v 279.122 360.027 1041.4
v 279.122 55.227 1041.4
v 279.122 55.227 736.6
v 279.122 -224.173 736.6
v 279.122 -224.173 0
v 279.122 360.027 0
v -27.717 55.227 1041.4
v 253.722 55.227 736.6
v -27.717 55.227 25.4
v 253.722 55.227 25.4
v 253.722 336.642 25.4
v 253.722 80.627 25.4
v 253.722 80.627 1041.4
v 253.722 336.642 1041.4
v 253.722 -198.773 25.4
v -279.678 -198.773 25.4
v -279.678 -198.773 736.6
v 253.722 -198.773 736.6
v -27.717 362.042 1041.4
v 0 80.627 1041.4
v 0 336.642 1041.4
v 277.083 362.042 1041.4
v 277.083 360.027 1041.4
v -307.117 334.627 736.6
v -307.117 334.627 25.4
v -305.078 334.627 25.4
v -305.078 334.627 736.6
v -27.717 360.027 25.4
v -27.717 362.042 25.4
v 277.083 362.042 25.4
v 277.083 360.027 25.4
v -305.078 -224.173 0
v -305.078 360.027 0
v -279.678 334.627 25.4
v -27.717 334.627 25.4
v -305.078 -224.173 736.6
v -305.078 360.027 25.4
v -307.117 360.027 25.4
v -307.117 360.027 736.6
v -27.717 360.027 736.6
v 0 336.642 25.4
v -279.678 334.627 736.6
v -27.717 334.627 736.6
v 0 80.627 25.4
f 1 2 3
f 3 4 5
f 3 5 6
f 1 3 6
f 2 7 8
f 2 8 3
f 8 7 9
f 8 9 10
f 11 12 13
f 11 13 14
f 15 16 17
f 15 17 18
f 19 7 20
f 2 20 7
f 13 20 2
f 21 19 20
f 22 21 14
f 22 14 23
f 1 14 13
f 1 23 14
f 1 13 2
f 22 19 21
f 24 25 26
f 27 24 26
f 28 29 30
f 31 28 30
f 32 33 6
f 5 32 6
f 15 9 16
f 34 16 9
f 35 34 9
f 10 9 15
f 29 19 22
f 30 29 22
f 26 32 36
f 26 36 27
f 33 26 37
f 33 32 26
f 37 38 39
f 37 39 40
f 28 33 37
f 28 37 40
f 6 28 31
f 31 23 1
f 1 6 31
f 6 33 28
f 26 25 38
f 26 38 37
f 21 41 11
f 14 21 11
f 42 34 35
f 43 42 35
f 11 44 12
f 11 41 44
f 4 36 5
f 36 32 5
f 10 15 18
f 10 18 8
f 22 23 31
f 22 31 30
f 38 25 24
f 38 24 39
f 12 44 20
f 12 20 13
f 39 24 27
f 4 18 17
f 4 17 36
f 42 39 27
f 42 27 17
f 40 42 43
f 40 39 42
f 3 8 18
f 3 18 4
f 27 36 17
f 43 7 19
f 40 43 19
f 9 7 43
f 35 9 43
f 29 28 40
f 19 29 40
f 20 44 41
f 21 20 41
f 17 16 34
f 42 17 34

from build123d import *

# Parameters (mm, degrees)
F0_W      = 584.2
F0_H      = 584.2
F1_DEPTH  = 25.4
F2_W      = 25.4
F2_H      = 304.8
F3_DEPTH  = 1016
F4_W      = 304.8
F4_H      = 25.4
F5_DEPTH  = 1016
F6_W      = 27.716884
F6_H      = 304.8
F7_DEPTH  = 1016
F8_W      = 306.838674
F8_H      = 25.4
F9_DEPTH  = 1016
F10_W     = 25.4
F10_H     = 279.4
F11_DEPTH = 711.2
F12_W     = 584.2
F12_H     = 25.4
F13_DEPTH = 711.2
F14_W     = 25.4
F14_H     = 584.2
F15_DEPTH = 711.2
F16_W     = 279.4
F16_H     = 25.4
F17_DEPTH = 711.2


with BuildPart() as f1:
    # F0 (on Top) → F1 (new body)
    with BuildSketch(Plane.XY):
        with Locations((-12.97821, 67.926513)):
            Rectangle(F0_W, F0_H)
    extrude(amount=F1_DEPTH)

    # F2 (on face) → F3 (join)
    with BuildSketch(Plane.XY.offset(25.4)):
        with Locations((266.42179, 207.626513)):
            Rectangle(F2_W, F2_H)
    extrude(amount=F3_DEPTH)

    # F4 (on face) → F5 (join)
    with BuildSketch(Plane.XY.offset(25.4)):
        with Locations((124.683116, 349.342086)):
            Rectangle(F4_W, F4_H)
    extrude(amount=F5_DEPTH)

    # F6 (on face) → F7 (join)
    with BuildSketch(Plane.XY.offset(25.4)):
        with Locations((-13.858442, 207.626513)):
            Rectangle(F6_W, F6_H)
    extrude(amount=F7_DEPTH)

    # F8 (on face) → F9 (join)
    with BuildSketch(Plane.XY.offset(25.4)):
        with Locations((125.702453, 67.926513)):
            Rectangle(F8_W, F8_H)
    extrude(amount=F9_DEPTH)

    # F10 (on face) → F11 (join)
    with BuildSketch(Plane.XY.offset(25.4)):
        with Locations((266.42179, -84.473487)):
            Rectangle(F10_W, F10_H)
    extrude(amount=F11_DEPTH)

    # F12 (on face) → F13 (join)
    with BuildSketch(Plane.XY.offset(25.4)):
        with Locations((-12.97821, -211.473487)):
            Rectangle(F12_W, F12_H)
    extrude(amount=F13_DEPTH)

    # F14 (on face) → F15 (join)
    with BuildSketch(Plane.XY.offset(25.4)):
        with Locations((-292.37821, 67.926513)):
            Rectangle(F14_W, F14_H)
    extrude(amount=F15_DEPTH)

    # F16 (on face) → F17 (join)
    with BuildSketch(Plane.XY.offset(25.4)):
        with Locations((-167.416884, 347.326513)):
            Rectangle(F16_W, F16_H)
    extrude(amount=F17_DEPTH)


solid = f1.part
